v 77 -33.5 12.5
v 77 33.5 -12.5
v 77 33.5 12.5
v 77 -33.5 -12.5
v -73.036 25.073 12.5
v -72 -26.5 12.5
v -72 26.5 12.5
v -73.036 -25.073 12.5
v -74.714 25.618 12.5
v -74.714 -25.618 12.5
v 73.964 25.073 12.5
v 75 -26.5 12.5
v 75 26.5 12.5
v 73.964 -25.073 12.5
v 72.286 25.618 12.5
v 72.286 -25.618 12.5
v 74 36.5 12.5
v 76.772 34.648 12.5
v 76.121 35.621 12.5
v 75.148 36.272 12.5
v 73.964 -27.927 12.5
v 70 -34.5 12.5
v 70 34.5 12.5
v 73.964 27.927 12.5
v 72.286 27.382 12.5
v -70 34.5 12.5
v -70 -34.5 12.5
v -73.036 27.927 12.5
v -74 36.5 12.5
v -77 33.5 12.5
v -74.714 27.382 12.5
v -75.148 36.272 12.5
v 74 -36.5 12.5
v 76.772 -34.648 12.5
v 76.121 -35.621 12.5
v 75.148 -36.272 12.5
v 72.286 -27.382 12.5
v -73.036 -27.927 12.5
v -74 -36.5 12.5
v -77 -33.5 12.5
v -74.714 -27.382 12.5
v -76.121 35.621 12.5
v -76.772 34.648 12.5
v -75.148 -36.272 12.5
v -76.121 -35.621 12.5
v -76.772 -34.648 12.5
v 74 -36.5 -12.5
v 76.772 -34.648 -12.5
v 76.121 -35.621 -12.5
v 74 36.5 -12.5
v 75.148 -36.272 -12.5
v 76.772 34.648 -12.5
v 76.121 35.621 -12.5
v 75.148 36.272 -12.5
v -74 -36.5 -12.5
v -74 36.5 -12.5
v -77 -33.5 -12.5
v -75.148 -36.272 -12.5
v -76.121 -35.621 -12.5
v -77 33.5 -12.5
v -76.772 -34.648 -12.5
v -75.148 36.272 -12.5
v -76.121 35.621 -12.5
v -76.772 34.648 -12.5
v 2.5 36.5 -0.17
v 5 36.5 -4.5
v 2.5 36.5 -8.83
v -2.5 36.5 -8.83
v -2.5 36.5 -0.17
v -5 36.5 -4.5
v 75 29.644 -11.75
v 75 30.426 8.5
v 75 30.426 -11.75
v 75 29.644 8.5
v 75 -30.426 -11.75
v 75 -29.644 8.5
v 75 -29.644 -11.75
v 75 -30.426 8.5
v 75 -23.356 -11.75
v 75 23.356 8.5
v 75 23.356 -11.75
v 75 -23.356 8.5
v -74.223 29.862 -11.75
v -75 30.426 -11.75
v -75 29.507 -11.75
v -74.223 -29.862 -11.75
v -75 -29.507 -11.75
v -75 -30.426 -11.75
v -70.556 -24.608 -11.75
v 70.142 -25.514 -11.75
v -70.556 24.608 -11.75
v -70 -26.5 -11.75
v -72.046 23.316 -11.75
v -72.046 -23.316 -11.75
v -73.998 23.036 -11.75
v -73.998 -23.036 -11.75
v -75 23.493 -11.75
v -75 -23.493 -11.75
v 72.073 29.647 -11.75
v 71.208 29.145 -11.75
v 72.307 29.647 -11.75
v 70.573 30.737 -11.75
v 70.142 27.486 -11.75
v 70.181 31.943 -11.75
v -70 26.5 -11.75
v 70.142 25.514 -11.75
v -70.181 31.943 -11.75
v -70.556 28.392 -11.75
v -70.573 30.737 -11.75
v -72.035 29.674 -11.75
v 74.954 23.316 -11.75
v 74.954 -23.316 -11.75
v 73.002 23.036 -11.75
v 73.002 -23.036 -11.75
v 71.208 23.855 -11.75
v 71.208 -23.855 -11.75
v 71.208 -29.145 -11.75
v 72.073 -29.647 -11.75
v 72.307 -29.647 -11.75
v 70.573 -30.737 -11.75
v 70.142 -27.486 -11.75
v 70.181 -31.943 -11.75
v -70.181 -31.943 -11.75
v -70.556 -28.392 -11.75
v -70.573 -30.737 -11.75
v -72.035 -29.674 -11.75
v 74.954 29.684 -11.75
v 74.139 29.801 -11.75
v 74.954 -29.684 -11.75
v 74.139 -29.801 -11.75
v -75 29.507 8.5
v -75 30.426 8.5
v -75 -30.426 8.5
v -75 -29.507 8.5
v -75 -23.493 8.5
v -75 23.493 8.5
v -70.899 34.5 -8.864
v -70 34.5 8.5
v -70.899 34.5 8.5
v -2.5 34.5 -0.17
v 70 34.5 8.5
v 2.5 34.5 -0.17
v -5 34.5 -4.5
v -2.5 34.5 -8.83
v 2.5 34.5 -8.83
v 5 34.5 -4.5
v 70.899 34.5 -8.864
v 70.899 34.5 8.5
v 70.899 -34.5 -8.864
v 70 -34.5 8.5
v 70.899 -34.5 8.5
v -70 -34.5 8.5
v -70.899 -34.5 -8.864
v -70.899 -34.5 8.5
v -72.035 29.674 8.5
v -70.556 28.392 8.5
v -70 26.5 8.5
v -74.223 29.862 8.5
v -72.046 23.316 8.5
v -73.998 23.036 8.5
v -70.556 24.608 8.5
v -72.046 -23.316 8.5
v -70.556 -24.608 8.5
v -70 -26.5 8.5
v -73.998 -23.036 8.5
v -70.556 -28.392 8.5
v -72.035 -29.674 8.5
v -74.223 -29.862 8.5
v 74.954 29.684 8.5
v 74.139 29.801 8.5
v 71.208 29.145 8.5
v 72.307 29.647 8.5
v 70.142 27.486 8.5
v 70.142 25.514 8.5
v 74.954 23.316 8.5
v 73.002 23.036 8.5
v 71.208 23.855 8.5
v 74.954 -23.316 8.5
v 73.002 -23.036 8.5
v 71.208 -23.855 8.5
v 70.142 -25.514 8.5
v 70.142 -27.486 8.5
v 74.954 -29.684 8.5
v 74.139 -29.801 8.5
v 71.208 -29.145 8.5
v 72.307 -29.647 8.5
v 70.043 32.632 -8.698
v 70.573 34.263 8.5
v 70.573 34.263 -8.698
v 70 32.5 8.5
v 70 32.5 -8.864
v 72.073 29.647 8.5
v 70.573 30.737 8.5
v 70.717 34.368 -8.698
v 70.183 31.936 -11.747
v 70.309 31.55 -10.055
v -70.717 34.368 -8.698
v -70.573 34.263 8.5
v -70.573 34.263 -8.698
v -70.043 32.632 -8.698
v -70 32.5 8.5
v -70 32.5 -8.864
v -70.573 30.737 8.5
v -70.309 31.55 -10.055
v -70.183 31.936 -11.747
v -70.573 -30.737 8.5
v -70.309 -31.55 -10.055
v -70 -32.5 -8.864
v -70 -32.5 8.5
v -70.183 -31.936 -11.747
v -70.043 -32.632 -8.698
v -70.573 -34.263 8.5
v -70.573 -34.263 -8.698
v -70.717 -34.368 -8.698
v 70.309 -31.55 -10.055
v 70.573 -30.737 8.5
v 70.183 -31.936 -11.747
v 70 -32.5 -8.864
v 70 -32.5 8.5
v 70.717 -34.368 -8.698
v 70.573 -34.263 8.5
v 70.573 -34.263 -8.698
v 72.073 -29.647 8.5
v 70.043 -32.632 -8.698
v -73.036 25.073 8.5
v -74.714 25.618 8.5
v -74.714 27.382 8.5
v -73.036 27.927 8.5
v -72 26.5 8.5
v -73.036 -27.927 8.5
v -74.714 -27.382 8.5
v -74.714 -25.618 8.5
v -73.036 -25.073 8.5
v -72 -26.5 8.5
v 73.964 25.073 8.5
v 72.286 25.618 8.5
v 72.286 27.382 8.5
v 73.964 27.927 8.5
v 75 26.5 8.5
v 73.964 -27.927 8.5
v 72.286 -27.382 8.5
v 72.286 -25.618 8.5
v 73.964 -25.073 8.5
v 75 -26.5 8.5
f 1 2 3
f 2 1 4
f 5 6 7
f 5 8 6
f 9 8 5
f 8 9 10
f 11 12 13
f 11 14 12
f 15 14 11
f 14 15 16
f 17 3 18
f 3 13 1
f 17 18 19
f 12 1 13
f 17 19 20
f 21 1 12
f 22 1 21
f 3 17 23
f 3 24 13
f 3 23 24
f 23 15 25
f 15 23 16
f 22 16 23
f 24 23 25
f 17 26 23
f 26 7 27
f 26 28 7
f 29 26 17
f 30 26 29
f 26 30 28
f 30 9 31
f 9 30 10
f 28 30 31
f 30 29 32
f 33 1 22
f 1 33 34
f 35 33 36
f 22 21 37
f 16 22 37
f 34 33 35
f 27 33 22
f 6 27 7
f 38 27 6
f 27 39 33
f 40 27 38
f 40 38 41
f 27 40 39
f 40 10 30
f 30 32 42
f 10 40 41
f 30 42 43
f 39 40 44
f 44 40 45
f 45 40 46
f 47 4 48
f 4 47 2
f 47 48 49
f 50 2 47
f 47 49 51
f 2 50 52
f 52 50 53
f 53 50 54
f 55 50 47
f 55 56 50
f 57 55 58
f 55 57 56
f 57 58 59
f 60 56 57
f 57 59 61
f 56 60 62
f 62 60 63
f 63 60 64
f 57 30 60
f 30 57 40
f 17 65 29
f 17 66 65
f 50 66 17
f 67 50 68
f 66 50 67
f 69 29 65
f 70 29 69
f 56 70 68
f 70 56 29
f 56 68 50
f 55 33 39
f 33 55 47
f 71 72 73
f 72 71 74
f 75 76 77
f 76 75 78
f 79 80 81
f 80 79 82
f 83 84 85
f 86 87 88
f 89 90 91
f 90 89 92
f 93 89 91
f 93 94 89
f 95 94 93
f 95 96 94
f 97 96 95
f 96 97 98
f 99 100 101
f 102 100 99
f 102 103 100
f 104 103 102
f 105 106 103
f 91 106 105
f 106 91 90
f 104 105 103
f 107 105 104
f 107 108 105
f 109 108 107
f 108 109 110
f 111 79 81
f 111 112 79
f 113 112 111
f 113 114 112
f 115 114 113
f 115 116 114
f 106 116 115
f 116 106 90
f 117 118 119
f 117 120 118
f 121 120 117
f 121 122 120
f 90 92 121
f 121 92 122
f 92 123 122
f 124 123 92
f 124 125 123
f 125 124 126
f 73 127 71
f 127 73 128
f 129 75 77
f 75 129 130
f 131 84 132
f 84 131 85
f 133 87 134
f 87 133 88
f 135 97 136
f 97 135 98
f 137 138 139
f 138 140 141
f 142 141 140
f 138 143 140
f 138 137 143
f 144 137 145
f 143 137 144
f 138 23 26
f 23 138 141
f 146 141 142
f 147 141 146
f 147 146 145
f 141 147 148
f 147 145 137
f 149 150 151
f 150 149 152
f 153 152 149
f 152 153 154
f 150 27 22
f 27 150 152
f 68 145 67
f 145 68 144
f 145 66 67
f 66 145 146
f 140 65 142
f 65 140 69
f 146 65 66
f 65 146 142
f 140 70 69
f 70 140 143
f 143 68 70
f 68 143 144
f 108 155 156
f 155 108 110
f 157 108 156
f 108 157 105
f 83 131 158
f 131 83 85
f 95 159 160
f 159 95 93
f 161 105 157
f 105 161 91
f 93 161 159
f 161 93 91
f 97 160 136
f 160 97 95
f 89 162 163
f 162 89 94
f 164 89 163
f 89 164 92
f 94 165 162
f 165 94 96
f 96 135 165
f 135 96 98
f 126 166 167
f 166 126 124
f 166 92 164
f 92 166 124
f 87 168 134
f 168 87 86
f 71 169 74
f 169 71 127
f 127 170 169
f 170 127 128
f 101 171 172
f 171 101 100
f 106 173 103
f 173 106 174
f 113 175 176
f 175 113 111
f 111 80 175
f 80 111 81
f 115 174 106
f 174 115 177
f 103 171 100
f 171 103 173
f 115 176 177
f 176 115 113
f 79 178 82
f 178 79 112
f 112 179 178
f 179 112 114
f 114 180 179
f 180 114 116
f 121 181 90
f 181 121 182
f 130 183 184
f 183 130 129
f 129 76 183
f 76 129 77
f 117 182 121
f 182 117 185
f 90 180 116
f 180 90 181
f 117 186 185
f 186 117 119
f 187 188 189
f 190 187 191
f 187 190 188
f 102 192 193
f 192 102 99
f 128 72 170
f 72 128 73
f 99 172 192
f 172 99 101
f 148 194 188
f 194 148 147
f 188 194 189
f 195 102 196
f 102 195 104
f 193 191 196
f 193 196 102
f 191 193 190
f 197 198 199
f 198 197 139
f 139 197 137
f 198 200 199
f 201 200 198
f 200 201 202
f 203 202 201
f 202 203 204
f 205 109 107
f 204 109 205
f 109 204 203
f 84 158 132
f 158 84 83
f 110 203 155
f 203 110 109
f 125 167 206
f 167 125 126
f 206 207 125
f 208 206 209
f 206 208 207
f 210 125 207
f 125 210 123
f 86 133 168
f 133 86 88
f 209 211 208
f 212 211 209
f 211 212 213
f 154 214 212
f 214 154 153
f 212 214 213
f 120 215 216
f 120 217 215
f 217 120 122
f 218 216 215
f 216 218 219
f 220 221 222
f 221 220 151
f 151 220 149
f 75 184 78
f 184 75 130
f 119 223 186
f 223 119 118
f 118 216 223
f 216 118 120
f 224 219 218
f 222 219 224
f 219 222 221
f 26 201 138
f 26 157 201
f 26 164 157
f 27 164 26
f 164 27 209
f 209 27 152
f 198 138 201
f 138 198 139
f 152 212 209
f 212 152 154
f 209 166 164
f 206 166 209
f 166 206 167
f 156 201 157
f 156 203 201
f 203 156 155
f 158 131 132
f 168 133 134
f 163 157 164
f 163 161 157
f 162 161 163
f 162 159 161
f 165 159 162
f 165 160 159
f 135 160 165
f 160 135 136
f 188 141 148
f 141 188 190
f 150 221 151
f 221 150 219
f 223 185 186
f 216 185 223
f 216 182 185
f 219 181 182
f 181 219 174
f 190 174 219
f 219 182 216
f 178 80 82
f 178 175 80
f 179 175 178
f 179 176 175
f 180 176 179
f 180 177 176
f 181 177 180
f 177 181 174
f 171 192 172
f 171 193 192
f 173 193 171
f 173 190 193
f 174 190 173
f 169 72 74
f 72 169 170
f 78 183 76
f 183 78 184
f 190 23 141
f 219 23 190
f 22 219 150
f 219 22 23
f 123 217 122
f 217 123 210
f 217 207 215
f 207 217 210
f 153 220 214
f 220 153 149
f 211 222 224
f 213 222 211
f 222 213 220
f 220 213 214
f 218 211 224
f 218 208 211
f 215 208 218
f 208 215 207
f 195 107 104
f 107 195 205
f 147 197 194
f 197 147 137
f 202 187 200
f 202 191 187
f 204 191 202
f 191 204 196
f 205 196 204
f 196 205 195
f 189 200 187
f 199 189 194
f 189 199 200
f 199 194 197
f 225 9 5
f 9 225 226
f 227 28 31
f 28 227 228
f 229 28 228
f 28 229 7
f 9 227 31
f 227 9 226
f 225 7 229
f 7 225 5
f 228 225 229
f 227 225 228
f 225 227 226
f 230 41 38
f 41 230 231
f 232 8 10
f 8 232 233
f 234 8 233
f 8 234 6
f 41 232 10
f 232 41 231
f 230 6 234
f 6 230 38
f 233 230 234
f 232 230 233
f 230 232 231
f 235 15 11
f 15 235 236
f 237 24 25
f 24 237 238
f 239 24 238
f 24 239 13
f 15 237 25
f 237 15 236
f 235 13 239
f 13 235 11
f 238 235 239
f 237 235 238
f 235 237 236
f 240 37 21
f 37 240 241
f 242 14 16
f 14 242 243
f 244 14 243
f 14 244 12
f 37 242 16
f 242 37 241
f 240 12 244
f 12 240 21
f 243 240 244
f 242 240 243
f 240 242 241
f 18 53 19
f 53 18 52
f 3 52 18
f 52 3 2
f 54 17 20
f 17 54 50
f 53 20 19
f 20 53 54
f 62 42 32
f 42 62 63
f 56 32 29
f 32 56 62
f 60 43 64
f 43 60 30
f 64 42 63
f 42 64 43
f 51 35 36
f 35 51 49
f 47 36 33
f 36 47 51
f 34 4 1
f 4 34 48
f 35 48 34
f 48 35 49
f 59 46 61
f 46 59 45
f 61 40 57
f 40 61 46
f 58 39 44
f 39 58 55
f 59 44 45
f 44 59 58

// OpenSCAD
l= 154;
w= 73;
d= 25;
inset= 7;
sep= 53;

holepos= [
	[-l/2+(inset/2), sep/2, d/2-1],
	[-l/2+(inset/2), -sep/2, d/2-1],
	[l/2-(inset/2), sep/2, d/2-1],
	[l/2-(inset/2), -sep/2, d/2-1] ];

//%translate([-64.5,-22.5,-6]) lcd();
case();

module lcd() {
	import("vikilcd.stl");
}

// generate a negative fillet for an edge
module fillet(pos= [0,0,0], radius=3, height=100, fn=16, angle= 0) {
   translate(pos) rotate([0,0,a]) translate([-radius, -radius, -height/2-0.01])
        difference() {
            cube([radius*2, radius*2, height+0.02]);
            cylinder(r=radius, h=height+0.02, $fn=fn);
        }
}

module case() {
	t= 0.5*4*2;
	rad= 3;

	difference() {
		union() {
			difference() {
				cube([l, w, d], center= true);
				translate([0,0,0.25*3]) cube([l-t, w-t, d], center= true);
				translate([0,w/2+2,-d/2+8]) rotate([90,0,0]) cylinder(r=5, h=6, $fn=6);
			}
			translate([-l/2,-w/2,d/2-4]) cube([7, w, 4]);
			translate([l/2-7,-w/2,d/2-4]) cube([7, w, 4]);
			// posts
			for(p= holepos) {
				translate(p-[0,0,d-1.1]) cylinder(r=3.5, h=d-1);
			}
			// corners
			for(p= [ [l/2-4,w/2-4, 0], [-l/2+4,w/2-4,0], [-l/2+4,-w/2+4,0], [l/2-4,-w/2+4,0] ]) {
				translate(p+[0,0,-d/2]) cylinder(r=3, h=d);
			}
			// base edges
			translate([-l/2+1,-w/2+3,-d/2+2]) rotate([0,90,0]) cylinder(r=2, h=l-2);
			translate([-l/2+1,w/2-3,-d/2+2]) rotate([0,90,0]) cylinder(r=2, h=l-2);

		}
		// mounting holes
		for(p= holepos) {
			#translate(p-[0,0,3]) cylinder(r=rad/2, h=5);
		}

		fillet(pos=[l/2,w/2,0], a= 0, radius=3, height= d+0.1);
		fillet(pos=[-l/2,w/2,0], a= 90, radius=3, height= d+0.1);
		fillet(pos=[l/2,-w/2,0], a= -90, radius=3, height= d+0.1);
		fillet(pos=[-l/2,-w/2,0], a= 180, radius=3, height= d+0.1);
	}
}

module mesh(gridX, gridY, meshSolid=1.0, meshSpace=10.0, thickness= 0.4) {
	borderX= 0;
	borderY= 0;
	meshX=gridX-(borderX*2);
	meshY=gridY-(borderY*2);
	nX=meshX/(meshSolid+meshSpace);
	nY=meshY/(meshSolid+meshSpace);

	for (i=[0:nX]) {
		 	 translate([-(meshX/2)+i*(meshSolid+meshSpace),-meshY/2,-thickness/2]) cube(size=[meshSolid,meshY,thickness],center=false);
	}

	for (i=[0:nY]) {
		 	translate([-meshX/2,-(meshY/2)+i*(meshSolid+meshSpace),-thickness/2]) cube(size=[meshX,meshSolid,thickness],center=false);

	}
}
